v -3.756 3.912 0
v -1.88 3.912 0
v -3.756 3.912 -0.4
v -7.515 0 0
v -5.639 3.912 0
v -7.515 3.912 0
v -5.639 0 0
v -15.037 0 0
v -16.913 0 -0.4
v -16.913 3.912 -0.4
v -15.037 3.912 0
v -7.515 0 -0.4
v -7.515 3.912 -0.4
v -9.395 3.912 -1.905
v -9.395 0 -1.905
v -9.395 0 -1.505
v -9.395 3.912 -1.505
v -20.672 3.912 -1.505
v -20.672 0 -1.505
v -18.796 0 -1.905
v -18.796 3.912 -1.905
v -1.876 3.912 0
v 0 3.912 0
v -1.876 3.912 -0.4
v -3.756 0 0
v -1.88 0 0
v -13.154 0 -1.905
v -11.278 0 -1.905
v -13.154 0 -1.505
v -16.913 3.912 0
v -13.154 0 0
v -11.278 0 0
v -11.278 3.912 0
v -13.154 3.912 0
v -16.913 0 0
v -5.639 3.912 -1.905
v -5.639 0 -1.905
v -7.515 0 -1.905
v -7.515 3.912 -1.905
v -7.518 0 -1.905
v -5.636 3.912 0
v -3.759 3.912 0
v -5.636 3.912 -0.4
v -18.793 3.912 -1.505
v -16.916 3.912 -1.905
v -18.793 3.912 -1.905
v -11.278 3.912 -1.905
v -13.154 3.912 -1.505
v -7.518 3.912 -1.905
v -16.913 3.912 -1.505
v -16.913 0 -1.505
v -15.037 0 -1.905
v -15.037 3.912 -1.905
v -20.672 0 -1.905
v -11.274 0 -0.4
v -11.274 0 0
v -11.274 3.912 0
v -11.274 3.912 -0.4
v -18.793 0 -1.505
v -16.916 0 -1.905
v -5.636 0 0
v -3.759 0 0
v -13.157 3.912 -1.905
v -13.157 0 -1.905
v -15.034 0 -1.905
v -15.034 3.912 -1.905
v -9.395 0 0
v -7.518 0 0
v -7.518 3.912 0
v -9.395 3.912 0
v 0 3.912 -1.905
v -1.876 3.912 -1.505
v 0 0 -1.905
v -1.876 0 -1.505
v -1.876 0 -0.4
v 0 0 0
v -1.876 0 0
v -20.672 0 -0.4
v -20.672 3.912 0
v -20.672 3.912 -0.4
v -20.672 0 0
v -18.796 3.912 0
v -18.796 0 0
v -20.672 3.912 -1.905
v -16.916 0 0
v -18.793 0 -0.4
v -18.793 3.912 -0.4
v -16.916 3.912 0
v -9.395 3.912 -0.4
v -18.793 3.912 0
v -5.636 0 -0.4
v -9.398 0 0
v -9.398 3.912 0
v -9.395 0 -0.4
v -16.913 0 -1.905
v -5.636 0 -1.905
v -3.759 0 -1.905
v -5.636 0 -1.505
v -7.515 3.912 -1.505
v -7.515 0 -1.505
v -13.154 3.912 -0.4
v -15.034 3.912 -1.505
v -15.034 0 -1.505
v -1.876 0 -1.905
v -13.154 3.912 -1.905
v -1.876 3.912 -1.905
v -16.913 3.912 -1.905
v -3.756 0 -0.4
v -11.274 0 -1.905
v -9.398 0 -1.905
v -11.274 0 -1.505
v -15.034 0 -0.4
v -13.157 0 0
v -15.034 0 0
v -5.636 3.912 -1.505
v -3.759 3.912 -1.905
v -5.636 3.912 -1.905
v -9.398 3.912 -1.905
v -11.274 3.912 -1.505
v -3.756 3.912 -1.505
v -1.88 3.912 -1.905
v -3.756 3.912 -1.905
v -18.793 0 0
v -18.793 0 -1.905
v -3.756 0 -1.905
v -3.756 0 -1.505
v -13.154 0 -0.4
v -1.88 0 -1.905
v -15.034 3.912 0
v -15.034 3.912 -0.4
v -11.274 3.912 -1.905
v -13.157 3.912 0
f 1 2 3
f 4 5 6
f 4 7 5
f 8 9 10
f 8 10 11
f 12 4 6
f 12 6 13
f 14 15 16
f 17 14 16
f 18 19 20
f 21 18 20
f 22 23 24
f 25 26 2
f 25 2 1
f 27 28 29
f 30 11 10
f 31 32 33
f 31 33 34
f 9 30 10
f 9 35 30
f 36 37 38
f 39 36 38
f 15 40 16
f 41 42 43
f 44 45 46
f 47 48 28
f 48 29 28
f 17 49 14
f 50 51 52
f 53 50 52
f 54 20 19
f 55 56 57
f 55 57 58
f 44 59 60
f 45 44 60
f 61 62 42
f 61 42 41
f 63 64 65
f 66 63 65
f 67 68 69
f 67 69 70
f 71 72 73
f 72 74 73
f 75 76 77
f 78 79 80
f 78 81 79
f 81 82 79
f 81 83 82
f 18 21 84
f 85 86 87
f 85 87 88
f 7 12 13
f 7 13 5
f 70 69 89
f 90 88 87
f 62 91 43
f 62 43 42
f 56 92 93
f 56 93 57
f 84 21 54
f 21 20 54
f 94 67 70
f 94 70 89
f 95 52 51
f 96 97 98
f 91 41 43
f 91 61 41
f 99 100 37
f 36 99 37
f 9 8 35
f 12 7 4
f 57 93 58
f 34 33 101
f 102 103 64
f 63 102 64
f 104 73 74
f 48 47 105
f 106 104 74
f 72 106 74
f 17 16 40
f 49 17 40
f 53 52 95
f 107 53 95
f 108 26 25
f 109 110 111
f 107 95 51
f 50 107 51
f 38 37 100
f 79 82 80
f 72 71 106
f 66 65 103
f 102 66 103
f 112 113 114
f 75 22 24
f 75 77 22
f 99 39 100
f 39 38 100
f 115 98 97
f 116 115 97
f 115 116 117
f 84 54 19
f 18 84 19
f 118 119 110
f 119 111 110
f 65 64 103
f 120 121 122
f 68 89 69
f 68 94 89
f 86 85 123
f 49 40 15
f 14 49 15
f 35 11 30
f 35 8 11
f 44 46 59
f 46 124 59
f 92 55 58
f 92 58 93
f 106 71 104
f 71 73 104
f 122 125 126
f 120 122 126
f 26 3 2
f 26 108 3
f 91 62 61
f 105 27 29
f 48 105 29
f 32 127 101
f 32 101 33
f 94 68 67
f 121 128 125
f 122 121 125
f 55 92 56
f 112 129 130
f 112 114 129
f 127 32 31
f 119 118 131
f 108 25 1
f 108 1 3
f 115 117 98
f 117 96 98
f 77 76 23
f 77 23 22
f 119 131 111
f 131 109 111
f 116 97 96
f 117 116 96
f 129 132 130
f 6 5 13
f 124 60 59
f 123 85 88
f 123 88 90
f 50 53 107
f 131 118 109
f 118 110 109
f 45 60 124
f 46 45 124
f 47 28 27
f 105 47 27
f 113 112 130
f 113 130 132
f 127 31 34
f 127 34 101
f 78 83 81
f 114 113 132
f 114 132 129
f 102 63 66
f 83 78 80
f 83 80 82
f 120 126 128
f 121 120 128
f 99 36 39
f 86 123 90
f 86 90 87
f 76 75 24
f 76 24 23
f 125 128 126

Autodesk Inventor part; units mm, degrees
ref_plane "YZ Plane" through (0, 0, 0) normal (1, 0, 0) x (0, 1, 0)
ref_plane "XZ Plane" through (0, 0, 0) normal (0, 1, 0) x (-1, 0, 0)
ref_plane "XY Plane" through (0, 0, 0) normal (0, 0, 1) x (1, 0, 0)
sketch "Sketch3" plane through (0, 0, 0) normal (0, 1, 0) x (-1, 0, 0)
  line L0 (0, 0) -> (1.8764, 0)
  line L1 (1.8764, 0) -> (1.8764, -0.4001)
  line L2 (1.8764, -0.4001) -> (0, 0)
  line L3 (0, 0) -> (0, -0.9525) construction
  line L4 (0, -0.9525) -> (30.0228, -0.9525) construction
  line L5 (0, -1.905) -> (1.8764, -1.905)
  line L6 (1.8764, -1.905) -> (1.8764, -1.5049)
  line L7 (1.8764, -1.5049) -> (0, -1.905)
  line L8 (5.6356, 0) -> (5.6356, -0.4001)
  line L9 (3.7592, 0) -> (5.6356, 0)
  line L10 (5.6356, -0.4001) -> (3.7592, 0)
  line L11 (5.6356, -1.5049) -> (3.7592, -1.905)
  line L12 (5.6356, -1.905) -> (5.6356, -1.5049)
  line L13 (3.7592, -1.905) -> (5.6356, -1.905)
  line L14 (9.3948, 0) -> (9.3948, -0.4001)
  line L15 (7.5184, 0) -> (9.3948, 0)
  line L16 (9.3948, -0.4001) -> (7.5184, 0)
  line L17 (9.3948, -1.5049) -> (7.5184, -1.905)
  line L18 (9.3948, -1.905) -> (9.3948, -1.5049)
  line L19 (7.5184, -1.905) -> (9.3948, -1.905)
  line L20 (13.154, 0) -> (13.154, -0.4001)
  line L21 (11.2776, 0) -> (13.154, 0)
  line L22 (13.154, -0.4001) -> (11.2776, 0)
  line L23 (13.154, -1.5049) -> (11.2776, -1.905)
  line L24 (13.154, -1.905) -> (13.154, -1.5049)
  line L25 (11.2776, -1.905) -> (13.154, -1.905)
  line L26 (16.9132, 0) -> (16.9132, -0.4001)
  line L27 (15.0368, 0) -> (16.9132, 0)
  line L28 (16.9132, -0.4001) -> (15.0368, 0)
  line L29 (16.9132, -1.5049) -> (15.0368, -1.905)
  line L30 (16.9132, -1.905) -> (16.9132, -1.5049)
  line L31 (15.0368, -1.905) -> (16.9132, -1.905)
  line L32 (20.6724, 0) -> (20.6724, -0.4001)
  line L33 (18.796, 0) -> (20.6724, 0)
  line L34 (20.6724, -0.4001) -> (18.796, 0)
  line L35 (20.6724, -1.5049) -> (18.796, -1.905)
  line L36 (20.6724, -1.905) -> (20.6724, -1.5049)
  line L37 (18.796, -1.905) -> (20.6724, -1.905)
  line L38 (1.8796, 0) -> (3.756, 0)
  line L39 (3.756, 0) -> (3.756, -0.4001)
  line L40 (1.8796, -1.905) -> (3.756, -1.905)
  line L41 (3.756, -1.5049) -> (1.8796, -1.905)
  line L42 (3.756, -0.4001) -> (1.8796, 0)
  line L43 (1.8796, 0) -> (1.8796, -0.9525) construction
  line L44 (3.756, -1.905) -> (3.756, -1.5049)
  line L45 (7.5152, -1.905) -> (7.5152, -1.5049)
  line L46 (5.6388, -1.905) -> (7.5152, -1.905)
  line L47 (7.5152, -1.5049) -> (5.6388, -1.905)
  line L48 (7.5152, 0) -> (7.5152, -0.4001)
  line L49 (5.6388, 0) -> (7.5152, 0)
  line L50 (7.5152, -0.4001) -> (5.6388, 0)
  line L51 (11.2744, 0) -> (11.2744, -0.4001)
  line L52 (9.398, 0) -> (11.2744, 0)
  line L53 (11.2744, -0.4001) -> (9.398, 0)
  line L54 (9.398, -1.905) -> (11.2744, -1.905)
  line L55 (11.2744, -1.905) -> (11.2744, -1.5049)
  line L56 (11.2744, -1.5049) -> (9.398, -1.905)
  line L57 (1.8796, -0.9525) -> (31.9024, -0.9525) construction
  line L58 (13.1572, 0) -> (15.0336, 0)
  line L59 (15.0336, -0.4001) -> (13.1572, 0)
  line L60 (13.1572, -1.905) -> (15.0336, -1.905)
  line L61 (15.0336, -1.5049) -> (13.1572, -1.905)
  line L62 (15.0336, -1.905) -> (15.0336, -1.5049)
  line L63 (15.0336, 0) -> (15.0336, -0.4001)
  line L64 (18.7928, 0) -> (18.7928, -0.4001)
  line L65 (16.9164, 0) -> (18.7928, 0)
  line L66 (18.7928, -0.4001) -> (16.9164, 0)
  line L67 (18.7928, -1.5049) -> (16.9164, -1.905)
  line L68 (18.7928, -1.905) -> (18.7928, -1.5049)
  line L69 (16.9164, -1.905) -> (18.7928, -1.905)
  dimension "d34" = 1.8764
  dimension "d35" = 0.4001
  dimension "d36" = 0.9525
  dimension "d37" = 30.0228
  dimension "d40" = 3.7592
  dimension "d49" = 1.8796
extrude "Extrusion2" add sketch "Sketch3" along normal blind 3.9116
properties part number "SawTeeth"
